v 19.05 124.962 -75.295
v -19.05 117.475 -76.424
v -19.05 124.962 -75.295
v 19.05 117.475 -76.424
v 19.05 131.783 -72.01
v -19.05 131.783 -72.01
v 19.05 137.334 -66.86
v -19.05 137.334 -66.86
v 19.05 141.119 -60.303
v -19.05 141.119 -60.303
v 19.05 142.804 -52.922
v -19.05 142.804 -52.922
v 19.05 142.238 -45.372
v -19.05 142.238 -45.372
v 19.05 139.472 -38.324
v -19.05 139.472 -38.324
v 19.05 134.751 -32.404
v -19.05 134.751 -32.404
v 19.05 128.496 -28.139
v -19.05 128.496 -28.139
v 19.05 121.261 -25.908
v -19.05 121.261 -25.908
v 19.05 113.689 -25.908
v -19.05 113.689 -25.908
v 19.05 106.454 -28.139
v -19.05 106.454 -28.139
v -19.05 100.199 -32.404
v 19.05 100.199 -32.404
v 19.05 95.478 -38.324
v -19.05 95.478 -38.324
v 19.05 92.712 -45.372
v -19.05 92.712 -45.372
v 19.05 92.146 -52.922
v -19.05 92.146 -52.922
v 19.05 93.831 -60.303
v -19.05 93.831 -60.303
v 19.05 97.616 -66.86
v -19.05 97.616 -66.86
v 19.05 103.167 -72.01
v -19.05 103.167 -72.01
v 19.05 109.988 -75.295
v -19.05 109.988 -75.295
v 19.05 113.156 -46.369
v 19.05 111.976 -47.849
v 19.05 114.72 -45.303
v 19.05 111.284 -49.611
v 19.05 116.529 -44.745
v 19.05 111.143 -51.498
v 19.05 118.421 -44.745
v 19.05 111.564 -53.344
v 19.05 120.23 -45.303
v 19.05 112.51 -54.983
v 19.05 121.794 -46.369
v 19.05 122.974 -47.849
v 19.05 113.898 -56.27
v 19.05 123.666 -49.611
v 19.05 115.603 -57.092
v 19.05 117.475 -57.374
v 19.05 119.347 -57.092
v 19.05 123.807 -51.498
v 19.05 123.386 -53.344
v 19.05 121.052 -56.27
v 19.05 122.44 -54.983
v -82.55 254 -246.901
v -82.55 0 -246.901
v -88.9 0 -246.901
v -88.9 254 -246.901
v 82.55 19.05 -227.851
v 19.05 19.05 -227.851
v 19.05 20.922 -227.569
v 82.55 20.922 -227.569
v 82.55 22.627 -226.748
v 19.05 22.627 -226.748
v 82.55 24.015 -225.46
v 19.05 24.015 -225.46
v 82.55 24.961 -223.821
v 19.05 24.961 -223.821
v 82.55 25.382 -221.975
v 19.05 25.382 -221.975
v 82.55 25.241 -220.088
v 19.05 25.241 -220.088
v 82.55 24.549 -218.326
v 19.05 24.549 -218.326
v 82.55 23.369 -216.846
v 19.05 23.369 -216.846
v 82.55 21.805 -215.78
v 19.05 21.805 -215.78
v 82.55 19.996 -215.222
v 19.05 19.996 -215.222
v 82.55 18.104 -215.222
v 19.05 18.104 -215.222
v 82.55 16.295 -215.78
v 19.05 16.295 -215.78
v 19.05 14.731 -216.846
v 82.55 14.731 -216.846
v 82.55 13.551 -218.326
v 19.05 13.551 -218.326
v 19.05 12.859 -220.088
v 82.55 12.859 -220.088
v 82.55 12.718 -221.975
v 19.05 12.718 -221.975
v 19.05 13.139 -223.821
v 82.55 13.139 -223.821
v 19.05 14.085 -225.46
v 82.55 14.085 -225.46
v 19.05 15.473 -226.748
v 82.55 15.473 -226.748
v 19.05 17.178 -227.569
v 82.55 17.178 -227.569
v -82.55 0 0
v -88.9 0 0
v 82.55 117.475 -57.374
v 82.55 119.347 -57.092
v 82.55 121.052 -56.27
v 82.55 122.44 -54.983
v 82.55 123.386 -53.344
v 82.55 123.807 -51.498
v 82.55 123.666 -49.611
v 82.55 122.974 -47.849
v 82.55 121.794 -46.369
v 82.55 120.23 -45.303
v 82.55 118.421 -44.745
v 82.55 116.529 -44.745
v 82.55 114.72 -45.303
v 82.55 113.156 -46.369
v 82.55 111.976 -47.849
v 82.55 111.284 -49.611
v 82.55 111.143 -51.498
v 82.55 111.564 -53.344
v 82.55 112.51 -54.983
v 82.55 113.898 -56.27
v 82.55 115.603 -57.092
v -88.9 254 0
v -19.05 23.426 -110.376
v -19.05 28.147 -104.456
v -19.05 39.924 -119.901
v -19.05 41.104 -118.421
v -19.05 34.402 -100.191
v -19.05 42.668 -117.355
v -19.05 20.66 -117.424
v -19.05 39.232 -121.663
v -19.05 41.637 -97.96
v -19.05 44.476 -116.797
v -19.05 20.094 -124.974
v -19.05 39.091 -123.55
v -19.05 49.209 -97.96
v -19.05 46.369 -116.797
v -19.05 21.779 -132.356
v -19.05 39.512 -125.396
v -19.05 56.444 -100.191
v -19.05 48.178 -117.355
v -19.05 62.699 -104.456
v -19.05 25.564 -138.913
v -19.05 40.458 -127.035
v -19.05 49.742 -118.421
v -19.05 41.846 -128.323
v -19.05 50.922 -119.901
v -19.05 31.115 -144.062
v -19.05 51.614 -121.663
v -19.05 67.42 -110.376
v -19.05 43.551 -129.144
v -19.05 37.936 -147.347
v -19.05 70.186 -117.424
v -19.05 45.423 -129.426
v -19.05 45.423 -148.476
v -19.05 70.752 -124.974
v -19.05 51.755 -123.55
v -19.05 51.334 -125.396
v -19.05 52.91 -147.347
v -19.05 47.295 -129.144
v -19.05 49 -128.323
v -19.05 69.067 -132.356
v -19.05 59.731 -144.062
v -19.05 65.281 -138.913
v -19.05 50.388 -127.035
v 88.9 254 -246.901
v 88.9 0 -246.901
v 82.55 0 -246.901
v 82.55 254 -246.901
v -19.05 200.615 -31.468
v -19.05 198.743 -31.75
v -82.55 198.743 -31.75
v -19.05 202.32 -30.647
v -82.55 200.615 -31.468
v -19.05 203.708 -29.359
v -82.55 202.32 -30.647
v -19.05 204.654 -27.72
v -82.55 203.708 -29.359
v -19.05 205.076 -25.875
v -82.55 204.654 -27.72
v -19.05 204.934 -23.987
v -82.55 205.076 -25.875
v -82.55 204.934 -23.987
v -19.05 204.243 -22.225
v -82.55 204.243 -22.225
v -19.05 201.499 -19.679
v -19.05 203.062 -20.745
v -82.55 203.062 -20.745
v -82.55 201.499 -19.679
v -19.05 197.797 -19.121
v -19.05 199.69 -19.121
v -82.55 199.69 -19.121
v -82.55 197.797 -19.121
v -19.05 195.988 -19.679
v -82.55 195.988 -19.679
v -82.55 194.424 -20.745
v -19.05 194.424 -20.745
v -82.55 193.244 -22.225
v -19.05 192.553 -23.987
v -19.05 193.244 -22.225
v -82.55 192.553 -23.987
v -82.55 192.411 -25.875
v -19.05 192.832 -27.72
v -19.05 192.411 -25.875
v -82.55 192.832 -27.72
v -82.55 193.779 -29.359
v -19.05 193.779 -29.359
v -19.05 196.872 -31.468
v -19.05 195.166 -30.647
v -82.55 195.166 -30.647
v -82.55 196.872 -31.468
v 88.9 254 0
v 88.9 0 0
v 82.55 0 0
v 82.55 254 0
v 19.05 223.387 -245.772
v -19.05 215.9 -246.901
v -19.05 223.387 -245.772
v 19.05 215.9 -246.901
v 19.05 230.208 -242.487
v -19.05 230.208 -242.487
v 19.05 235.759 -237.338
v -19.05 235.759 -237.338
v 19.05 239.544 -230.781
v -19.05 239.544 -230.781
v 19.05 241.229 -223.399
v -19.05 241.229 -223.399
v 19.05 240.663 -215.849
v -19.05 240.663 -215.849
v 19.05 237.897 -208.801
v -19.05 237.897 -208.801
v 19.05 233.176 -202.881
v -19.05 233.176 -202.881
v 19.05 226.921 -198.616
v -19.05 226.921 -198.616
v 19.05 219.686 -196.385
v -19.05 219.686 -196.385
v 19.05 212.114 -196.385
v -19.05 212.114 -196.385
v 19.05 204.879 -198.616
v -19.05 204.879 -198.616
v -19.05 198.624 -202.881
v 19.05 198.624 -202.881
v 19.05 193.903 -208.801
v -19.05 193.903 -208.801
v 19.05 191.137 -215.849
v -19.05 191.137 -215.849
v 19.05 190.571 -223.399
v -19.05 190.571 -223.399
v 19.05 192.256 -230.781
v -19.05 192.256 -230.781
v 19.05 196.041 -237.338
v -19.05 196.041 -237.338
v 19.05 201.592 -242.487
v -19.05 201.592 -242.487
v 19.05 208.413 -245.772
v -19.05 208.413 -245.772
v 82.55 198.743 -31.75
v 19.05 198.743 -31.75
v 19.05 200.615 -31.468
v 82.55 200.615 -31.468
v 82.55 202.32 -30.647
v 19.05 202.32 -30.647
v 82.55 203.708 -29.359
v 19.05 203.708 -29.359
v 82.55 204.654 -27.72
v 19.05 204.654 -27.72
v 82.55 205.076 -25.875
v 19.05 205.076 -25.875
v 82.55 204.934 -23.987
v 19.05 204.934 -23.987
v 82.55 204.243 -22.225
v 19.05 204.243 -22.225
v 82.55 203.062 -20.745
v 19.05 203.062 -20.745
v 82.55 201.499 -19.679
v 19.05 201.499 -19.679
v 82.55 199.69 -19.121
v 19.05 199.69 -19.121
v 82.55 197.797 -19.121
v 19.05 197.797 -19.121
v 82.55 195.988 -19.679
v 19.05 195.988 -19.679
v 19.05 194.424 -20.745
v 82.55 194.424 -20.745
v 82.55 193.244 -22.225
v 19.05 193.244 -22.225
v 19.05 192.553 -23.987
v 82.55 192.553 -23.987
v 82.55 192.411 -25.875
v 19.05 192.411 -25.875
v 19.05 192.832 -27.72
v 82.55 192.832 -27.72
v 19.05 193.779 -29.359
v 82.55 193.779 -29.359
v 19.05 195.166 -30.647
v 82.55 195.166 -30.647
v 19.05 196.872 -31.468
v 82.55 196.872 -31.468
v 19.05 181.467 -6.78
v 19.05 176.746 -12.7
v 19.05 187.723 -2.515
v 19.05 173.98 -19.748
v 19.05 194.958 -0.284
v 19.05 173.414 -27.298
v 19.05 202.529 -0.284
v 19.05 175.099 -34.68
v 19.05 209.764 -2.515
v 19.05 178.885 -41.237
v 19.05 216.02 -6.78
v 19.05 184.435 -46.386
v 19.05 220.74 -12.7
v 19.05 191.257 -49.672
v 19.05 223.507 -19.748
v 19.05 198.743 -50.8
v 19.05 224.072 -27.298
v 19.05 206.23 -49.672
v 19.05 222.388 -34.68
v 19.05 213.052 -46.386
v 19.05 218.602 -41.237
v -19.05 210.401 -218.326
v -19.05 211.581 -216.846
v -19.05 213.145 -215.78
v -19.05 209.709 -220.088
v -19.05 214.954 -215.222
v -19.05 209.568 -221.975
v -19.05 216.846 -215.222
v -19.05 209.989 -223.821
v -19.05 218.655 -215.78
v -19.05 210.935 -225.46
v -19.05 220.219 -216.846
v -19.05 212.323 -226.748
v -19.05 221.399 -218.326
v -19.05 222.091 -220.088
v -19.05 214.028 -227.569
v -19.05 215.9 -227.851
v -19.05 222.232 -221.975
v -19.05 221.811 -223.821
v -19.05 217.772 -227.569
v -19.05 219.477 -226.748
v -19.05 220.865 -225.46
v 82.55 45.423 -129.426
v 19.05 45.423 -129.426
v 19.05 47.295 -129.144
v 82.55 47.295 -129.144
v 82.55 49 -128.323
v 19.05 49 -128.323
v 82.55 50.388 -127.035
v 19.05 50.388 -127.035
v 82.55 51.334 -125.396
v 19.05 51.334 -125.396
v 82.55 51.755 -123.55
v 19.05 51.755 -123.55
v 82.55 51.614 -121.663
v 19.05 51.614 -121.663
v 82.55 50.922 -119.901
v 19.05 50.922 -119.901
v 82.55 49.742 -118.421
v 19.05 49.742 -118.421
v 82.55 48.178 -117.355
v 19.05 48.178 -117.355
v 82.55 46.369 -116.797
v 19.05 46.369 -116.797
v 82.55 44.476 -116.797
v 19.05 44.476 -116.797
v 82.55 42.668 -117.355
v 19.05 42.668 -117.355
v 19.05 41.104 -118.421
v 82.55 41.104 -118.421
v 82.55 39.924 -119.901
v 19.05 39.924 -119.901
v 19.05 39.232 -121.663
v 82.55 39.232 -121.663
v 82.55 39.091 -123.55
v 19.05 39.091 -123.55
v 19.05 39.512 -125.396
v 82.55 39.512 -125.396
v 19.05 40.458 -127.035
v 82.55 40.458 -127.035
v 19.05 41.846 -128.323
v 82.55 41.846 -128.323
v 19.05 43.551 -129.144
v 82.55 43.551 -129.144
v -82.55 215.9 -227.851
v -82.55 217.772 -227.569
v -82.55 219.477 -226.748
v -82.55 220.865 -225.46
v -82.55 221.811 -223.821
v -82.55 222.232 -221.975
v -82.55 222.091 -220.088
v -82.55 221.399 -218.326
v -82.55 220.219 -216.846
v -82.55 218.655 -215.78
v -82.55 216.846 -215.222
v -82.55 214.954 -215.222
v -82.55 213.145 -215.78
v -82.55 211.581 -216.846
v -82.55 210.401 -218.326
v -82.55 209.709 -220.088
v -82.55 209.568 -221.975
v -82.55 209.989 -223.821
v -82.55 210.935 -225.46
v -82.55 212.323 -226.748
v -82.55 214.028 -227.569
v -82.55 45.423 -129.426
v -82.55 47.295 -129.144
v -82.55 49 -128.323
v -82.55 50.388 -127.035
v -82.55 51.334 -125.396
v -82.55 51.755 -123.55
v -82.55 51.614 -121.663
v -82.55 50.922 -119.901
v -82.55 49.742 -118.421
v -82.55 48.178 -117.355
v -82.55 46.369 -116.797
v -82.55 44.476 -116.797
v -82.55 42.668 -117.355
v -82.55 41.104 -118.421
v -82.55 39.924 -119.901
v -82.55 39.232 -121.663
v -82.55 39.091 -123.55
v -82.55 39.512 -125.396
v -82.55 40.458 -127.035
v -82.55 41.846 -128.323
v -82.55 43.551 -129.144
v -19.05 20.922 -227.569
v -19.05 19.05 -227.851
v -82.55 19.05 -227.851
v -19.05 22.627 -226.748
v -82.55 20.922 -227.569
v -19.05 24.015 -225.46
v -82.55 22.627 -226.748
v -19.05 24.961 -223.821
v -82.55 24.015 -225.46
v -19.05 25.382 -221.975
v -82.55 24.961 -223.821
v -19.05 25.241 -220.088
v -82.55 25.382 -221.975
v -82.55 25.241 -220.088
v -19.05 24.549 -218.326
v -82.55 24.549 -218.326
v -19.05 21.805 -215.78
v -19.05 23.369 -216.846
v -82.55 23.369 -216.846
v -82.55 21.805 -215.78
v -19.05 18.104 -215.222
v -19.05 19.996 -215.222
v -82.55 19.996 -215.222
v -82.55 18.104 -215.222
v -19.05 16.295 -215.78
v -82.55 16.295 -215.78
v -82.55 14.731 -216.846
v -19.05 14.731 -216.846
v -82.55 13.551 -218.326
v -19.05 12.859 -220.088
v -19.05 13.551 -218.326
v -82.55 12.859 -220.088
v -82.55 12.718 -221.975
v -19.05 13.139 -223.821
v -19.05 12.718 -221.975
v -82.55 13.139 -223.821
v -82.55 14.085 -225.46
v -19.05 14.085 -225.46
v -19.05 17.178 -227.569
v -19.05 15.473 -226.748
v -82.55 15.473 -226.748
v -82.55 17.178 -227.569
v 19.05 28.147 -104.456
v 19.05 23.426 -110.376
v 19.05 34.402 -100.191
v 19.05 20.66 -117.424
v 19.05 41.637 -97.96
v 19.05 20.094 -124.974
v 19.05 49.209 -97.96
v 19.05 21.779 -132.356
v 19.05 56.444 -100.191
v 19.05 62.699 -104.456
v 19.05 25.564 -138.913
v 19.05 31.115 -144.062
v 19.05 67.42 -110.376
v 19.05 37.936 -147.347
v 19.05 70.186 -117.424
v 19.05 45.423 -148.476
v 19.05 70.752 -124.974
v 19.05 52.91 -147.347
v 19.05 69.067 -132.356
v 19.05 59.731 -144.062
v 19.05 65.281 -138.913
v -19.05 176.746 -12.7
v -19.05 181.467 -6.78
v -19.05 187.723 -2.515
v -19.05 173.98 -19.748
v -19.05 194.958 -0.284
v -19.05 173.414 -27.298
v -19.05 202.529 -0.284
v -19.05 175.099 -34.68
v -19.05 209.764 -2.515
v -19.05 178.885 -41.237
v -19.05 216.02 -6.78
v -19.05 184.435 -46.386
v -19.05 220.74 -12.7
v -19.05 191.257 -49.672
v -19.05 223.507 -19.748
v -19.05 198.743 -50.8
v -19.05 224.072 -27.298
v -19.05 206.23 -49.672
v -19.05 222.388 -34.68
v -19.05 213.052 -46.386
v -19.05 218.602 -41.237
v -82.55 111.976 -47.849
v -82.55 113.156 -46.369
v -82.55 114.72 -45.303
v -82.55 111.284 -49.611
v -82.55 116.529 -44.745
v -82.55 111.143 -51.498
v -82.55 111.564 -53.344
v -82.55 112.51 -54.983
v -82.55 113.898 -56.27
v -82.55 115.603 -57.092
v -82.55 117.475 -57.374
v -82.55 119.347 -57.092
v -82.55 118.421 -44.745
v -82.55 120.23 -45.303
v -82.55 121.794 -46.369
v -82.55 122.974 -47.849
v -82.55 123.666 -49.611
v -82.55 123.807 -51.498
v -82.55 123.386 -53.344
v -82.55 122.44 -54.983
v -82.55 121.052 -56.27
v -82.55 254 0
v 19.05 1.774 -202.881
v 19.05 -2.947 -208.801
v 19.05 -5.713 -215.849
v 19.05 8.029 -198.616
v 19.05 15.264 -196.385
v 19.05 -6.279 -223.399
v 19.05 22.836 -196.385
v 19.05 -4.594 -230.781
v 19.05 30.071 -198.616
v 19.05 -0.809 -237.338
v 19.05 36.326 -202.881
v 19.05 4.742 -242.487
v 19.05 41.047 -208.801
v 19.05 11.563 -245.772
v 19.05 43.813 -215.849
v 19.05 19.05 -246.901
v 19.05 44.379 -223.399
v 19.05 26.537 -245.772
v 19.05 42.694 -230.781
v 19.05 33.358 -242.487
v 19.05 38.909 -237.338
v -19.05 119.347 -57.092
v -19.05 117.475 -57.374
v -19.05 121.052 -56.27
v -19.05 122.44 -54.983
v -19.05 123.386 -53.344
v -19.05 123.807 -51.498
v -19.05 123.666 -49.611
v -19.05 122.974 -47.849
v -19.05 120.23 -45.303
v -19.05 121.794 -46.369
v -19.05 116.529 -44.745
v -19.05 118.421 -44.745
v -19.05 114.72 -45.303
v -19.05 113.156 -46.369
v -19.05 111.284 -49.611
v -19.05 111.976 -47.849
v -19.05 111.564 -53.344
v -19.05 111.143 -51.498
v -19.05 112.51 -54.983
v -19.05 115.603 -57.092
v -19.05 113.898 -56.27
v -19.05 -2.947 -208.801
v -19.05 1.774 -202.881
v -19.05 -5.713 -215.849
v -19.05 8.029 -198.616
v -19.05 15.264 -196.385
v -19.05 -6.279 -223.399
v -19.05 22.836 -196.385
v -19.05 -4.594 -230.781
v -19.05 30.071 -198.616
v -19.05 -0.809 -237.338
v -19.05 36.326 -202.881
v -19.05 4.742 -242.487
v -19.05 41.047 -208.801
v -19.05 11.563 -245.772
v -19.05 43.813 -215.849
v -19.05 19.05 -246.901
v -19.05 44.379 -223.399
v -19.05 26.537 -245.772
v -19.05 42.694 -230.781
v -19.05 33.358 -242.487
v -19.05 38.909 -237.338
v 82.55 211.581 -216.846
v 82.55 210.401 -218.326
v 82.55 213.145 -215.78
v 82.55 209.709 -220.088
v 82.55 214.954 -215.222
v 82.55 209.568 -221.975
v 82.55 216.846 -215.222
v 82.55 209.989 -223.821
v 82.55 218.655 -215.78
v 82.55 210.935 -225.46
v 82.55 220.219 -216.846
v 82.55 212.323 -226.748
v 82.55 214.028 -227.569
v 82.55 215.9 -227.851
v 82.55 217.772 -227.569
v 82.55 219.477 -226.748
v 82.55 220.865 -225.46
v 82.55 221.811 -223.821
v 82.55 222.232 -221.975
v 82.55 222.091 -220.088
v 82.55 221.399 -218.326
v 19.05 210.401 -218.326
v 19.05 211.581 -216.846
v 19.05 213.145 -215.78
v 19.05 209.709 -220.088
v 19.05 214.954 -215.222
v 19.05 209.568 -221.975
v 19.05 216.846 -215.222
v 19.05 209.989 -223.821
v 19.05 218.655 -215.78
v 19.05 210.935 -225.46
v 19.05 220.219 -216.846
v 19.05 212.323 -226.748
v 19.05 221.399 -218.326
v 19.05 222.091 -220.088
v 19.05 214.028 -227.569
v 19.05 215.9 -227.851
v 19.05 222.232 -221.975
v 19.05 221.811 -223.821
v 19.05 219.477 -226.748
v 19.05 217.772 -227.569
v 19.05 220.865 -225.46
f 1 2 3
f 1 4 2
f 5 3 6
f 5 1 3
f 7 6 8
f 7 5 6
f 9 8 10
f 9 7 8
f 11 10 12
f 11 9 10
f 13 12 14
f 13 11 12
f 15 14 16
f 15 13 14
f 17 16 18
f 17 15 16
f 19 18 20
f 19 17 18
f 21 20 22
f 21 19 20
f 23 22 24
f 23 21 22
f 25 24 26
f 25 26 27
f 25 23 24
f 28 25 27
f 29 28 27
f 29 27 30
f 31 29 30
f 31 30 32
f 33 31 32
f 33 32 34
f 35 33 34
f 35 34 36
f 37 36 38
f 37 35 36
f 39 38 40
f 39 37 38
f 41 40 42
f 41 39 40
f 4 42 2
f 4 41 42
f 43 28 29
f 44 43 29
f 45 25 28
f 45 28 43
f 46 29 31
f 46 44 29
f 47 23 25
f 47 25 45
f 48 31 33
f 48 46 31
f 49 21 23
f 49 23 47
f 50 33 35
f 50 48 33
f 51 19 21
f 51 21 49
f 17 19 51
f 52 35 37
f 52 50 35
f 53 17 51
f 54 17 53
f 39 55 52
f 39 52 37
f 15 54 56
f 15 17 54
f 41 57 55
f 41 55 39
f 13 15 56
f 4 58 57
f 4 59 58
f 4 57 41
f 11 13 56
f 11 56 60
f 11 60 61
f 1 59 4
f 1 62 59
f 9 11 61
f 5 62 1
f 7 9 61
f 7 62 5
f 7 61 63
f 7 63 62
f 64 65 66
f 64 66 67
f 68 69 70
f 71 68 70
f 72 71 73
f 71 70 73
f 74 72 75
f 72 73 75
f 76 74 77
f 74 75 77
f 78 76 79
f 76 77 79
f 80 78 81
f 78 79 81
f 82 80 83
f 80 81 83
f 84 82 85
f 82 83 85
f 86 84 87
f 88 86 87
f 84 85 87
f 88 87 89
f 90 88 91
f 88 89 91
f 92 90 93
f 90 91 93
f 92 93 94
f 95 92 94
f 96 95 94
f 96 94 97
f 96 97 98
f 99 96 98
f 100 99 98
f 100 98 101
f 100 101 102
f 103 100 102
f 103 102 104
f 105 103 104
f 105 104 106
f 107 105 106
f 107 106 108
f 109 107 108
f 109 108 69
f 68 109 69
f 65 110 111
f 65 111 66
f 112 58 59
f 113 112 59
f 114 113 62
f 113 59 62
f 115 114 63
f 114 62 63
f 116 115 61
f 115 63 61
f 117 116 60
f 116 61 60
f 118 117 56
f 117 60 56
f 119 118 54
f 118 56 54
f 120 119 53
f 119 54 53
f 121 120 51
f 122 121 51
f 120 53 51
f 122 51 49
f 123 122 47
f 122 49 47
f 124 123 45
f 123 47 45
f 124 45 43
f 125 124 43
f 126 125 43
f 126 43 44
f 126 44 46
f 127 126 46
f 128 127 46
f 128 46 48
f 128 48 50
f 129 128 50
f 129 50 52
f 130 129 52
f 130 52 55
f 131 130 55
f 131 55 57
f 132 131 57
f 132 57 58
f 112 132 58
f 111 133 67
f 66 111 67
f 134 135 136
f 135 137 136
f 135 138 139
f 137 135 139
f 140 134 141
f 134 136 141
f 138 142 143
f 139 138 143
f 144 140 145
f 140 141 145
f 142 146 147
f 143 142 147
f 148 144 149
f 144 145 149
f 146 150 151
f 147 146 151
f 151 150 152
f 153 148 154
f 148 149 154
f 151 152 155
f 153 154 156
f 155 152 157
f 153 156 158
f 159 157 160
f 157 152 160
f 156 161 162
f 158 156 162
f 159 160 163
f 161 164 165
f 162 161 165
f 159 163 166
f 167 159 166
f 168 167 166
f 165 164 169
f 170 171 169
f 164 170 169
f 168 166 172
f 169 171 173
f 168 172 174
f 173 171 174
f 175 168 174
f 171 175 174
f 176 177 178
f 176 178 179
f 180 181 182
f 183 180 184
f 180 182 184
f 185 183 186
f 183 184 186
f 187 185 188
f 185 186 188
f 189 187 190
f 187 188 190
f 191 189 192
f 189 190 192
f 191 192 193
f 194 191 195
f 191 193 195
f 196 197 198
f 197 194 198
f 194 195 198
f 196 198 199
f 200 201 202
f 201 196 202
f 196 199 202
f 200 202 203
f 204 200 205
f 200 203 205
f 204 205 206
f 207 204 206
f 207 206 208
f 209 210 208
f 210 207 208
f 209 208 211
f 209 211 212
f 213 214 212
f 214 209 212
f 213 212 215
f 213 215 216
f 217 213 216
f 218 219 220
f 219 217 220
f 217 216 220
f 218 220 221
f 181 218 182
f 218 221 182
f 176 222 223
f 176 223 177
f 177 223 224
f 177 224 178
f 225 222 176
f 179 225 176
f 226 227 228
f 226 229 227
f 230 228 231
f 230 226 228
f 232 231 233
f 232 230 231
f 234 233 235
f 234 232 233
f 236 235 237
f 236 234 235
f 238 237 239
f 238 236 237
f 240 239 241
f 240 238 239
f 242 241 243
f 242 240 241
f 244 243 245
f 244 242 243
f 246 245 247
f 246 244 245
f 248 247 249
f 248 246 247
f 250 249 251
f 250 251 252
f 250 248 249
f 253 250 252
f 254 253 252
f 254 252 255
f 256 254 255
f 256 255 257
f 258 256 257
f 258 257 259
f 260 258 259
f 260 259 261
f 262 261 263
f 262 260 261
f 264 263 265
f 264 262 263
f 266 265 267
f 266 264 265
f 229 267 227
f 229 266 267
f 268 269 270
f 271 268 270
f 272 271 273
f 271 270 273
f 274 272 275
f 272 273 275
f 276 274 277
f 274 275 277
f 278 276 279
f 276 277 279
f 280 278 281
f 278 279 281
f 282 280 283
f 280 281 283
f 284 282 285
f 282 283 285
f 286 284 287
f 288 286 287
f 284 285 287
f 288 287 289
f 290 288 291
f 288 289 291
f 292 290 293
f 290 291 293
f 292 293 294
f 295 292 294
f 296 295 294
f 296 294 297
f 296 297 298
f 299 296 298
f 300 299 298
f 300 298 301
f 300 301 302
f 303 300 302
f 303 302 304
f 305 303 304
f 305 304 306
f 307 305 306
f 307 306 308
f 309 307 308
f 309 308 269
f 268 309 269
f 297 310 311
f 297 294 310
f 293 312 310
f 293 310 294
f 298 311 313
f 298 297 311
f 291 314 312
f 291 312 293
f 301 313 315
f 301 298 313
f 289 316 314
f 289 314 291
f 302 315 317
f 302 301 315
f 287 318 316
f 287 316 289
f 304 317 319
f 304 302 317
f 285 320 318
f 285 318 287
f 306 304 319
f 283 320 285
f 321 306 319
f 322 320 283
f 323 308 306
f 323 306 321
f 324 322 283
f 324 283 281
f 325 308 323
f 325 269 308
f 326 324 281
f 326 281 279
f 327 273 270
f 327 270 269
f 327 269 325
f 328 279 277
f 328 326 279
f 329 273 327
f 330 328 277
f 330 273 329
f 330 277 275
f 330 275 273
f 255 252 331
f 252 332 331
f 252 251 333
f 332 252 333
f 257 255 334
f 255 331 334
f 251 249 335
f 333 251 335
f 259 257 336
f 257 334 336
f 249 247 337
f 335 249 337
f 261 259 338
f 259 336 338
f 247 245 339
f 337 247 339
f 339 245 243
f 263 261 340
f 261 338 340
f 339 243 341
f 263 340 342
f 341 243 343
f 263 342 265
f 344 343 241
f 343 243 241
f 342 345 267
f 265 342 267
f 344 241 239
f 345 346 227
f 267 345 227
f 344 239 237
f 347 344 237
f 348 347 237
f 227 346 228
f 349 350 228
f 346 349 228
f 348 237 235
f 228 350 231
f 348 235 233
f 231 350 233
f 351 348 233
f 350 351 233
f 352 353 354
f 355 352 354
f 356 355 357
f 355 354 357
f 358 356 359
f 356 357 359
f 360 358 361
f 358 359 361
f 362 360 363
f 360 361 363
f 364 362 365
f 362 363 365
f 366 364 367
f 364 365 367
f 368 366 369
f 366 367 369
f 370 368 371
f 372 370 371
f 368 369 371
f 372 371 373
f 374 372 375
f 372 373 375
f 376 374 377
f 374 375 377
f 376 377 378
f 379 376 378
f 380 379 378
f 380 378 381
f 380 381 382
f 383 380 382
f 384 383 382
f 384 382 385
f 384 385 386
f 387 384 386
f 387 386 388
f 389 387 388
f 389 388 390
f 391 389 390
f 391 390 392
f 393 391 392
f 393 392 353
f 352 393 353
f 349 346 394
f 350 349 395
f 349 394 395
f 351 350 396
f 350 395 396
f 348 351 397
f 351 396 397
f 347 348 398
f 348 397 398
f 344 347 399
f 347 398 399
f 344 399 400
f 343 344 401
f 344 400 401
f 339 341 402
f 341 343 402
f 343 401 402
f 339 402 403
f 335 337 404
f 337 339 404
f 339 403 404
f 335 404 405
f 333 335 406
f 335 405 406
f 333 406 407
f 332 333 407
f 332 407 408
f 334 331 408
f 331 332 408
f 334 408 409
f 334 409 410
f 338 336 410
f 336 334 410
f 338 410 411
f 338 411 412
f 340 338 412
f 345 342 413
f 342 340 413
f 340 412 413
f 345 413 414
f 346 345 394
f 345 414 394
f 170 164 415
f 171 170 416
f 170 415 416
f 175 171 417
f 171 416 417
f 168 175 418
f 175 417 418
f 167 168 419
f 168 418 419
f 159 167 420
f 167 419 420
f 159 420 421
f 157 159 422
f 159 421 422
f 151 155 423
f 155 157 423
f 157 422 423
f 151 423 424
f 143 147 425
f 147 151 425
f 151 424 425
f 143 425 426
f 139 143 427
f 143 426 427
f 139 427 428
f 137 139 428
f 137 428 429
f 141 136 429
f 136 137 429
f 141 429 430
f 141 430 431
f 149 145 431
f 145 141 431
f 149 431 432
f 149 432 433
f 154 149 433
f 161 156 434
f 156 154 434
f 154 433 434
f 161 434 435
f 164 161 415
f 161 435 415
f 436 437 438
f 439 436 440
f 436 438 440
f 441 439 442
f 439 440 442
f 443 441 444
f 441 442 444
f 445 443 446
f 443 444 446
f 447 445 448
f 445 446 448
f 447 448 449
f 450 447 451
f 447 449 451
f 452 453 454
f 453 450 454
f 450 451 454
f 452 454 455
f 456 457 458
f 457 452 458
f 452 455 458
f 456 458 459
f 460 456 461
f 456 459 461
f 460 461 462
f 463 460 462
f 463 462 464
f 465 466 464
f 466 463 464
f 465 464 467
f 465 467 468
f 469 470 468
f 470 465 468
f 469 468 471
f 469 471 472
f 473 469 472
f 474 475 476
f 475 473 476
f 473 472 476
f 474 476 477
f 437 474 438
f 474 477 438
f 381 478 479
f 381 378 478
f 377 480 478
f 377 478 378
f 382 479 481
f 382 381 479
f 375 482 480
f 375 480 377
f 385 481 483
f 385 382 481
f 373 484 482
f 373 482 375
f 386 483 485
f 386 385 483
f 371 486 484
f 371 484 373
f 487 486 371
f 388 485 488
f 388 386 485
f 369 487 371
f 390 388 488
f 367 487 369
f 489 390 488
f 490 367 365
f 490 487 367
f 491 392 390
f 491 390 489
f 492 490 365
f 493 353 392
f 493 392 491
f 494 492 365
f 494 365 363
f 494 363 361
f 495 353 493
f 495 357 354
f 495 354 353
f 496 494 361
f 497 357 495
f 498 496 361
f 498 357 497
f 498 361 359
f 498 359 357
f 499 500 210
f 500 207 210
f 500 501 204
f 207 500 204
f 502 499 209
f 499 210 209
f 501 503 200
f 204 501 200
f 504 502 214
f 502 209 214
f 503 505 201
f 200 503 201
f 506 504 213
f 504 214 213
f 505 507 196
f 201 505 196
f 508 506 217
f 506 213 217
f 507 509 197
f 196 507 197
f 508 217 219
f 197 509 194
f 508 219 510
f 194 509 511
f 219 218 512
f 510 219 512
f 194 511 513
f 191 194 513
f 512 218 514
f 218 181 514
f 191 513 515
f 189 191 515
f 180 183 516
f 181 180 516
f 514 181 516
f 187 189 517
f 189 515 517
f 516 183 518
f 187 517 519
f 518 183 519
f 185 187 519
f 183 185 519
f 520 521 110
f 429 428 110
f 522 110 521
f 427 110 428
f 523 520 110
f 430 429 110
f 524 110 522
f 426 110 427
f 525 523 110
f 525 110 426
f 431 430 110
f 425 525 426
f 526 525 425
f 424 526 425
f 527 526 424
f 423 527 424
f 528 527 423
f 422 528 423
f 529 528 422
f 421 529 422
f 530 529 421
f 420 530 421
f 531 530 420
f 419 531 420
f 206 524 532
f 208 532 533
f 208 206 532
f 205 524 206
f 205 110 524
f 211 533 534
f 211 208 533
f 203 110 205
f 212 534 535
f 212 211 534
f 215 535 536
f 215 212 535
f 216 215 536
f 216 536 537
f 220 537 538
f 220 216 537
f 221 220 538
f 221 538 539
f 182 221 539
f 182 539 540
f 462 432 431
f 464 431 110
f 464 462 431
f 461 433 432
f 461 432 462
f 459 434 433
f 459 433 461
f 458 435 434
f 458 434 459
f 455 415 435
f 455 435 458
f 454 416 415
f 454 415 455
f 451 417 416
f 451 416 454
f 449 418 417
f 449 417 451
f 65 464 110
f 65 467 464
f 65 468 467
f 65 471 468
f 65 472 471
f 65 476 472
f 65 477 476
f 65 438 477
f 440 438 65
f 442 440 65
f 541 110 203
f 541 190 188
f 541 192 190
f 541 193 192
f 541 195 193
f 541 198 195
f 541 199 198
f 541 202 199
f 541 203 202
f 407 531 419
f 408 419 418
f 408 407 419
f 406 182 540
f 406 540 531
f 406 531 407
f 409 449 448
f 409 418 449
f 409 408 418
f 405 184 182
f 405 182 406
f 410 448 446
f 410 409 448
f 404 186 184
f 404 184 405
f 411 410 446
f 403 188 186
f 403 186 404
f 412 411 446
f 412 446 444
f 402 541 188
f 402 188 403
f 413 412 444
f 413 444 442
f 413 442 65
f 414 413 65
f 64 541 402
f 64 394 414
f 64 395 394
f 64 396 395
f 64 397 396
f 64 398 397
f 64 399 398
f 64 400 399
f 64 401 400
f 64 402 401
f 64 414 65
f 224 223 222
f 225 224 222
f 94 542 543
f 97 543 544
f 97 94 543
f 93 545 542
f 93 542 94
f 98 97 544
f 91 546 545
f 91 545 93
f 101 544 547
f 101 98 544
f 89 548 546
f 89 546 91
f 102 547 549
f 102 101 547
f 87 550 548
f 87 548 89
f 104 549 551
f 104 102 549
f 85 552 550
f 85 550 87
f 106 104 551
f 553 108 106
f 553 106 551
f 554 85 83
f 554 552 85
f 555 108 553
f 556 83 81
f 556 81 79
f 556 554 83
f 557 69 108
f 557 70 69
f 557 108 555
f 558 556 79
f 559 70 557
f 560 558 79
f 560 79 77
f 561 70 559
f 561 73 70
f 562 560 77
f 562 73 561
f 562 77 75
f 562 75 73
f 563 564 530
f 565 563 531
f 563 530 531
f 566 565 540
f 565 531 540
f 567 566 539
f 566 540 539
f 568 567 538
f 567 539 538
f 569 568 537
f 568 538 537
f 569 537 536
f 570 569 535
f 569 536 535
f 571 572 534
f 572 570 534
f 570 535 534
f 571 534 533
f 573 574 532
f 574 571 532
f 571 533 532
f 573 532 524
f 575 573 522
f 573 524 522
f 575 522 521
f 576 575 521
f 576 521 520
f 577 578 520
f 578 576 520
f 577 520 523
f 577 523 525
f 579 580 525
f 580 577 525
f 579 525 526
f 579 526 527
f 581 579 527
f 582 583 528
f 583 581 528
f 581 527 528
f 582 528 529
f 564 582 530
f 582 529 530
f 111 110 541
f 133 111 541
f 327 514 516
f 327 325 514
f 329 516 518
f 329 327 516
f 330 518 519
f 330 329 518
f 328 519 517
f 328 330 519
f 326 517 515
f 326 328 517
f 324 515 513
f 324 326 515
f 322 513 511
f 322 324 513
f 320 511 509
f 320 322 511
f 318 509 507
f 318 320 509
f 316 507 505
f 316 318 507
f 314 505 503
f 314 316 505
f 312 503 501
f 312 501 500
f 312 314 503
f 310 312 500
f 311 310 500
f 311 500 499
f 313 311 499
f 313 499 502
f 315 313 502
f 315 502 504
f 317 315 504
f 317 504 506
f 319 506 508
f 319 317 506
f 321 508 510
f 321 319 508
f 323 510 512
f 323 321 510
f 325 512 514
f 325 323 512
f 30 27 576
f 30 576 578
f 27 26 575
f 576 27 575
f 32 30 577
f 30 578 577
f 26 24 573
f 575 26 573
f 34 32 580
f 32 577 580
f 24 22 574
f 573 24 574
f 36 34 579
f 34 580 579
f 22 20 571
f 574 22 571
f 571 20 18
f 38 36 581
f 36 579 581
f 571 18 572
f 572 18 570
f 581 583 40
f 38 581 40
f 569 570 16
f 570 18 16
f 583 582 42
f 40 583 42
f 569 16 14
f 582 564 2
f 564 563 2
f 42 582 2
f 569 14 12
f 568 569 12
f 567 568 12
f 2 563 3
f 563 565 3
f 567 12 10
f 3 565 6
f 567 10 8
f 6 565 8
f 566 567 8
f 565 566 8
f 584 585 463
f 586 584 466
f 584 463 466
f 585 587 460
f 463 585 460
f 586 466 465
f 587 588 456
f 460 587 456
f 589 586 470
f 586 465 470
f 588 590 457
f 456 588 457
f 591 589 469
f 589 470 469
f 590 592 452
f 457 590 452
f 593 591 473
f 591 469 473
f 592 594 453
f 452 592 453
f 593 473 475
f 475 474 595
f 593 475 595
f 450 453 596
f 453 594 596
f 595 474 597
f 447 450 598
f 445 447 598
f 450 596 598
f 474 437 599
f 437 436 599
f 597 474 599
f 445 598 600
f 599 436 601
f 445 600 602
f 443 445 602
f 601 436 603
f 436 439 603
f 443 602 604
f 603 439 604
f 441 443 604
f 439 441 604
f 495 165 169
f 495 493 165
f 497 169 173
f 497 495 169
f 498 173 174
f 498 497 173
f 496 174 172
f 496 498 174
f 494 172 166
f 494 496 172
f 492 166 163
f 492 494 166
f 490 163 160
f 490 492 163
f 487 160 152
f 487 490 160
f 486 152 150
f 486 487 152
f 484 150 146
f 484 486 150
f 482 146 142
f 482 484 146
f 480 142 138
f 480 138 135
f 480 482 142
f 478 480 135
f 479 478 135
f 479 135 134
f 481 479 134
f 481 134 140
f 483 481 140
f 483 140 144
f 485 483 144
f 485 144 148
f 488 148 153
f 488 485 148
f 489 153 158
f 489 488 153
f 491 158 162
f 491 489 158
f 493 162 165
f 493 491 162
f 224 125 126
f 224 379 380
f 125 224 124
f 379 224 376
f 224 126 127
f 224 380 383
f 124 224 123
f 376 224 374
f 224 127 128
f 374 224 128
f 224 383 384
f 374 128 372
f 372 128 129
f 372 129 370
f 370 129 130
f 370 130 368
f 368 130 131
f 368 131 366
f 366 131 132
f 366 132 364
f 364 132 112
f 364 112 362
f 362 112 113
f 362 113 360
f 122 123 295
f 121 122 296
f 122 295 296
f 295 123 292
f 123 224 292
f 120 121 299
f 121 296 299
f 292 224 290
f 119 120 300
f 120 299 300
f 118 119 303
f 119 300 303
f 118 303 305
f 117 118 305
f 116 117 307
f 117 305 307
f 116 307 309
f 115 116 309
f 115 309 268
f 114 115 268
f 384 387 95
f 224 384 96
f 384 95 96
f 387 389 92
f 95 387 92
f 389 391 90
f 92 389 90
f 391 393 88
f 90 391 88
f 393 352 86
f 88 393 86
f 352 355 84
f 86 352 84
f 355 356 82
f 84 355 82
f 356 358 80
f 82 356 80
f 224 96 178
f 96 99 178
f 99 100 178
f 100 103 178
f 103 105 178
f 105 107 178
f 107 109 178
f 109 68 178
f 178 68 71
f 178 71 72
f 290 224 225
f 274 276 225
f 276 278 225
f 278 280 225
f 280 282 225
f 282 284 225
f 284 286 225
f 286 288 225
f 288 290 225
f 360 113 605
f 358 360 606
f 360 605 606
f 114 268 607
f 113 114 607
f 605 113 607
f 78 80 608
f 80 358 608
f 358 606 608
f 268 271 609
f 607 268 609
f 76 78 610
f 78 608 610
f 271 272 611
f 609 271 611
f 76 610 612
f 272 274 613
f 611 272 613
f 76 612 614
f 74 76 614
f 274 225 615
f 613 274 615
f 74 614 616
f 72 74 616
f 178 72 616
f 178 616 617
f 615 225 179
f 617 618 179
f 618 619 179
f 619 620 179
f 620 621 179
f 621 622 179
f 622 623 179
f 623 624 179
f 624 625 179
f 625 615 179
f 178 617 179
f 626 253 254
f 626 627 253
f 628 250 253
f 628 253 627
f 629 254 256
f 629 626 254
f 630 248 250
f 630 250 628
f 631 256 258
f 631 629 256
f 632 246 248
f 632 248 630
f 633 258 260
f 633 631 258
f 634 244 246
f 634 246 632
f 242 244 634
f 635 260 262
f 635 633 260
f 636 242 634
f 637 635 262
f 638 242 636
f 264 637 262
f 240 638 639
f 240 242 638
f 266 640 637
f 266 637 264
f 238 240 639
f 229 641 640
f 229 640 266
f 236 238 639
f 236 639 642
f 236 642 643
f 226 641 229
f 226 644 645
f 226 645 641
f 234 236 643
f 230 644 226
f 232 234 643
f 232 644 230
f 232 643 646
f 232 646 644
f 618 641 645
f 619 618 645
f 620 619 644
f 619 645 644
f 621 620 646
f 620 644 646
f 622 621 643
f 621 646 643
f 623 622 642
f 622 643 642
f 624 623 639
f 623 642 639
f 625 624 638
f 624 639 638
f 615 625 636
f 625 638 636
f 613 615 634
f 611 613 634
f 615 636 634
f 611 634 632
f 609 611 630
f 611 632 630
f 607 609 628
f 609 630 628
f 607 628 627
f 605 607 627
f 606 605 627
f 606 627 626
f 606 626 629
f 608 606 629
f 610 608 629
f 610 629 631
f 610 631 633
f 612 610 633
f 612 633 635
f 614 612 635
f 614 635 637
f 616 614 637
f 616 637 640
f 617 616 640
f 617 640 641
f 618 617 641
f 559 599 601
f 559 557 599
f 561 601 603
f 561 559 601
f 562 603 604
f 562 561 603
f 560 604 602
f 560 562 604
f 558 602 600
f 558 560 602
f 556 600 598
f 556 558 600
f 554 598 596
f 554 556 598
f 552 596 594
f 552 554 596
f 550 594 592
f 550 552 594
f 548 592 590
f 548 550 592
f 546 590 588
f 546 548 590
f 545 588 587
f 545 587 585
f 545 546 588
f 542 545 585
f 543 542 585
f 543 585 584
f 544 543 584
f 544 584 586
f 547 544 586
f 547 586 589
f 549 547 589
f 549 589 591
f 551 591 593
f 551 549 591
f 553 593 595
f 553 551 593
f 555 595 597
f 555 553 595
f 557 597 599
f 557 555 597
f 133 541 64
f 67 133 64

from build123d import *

# Parameters (mm, degrees)
SKETCH1_W               = 246.900926319
SKETCH1_H               = 254
BOSS_EXTRUDE1_DEPTH     = 88.9
SKETCH2_W               = 165.1
SKETCH2_H               = 246.900926319
CUT_EXTRUDE1_DEPTH      = 1
CUT_EXTRUDE1_DEPTH_BACK = 255
SKETCH3_R               = 25.4
BOSS_EXTRUDE2_DEPTH     = 19.05
BOSS_EXTRUDE2_2_DEPTH   = 19.05
BOSS_EXTRUDE2_3_DEPTH   = 19.05
BOSS_EXTRUDE2_4_DEPTH   = 19.05
BOSS_EXTRUDE2_5_DEPTH   = 19.05
BOSS_EXTRUDE3_START     = -82.55
SKETCH4_R               = 6.35
BOSS_EXTRUDE3_DEPTH     = 165.1


with BuildPart() as part:
    # Sketch1 → Boss-Extrude1 (new body, symmetric)
    with BuildSketch(Plane(origin=(0, 0, 0), x_dir=(0, 0, -1), z_dir=(1, 0, 0))):
        with Locations((123.45046316, 127)):
            Rectangle(SKETCH1_W, SKETCH1_H)
    extrude(amount=BOSS_EXTRUDE1_DEPTH, both=True)

    # Sketch2 → Cut-Extrude1 (cut, two sides)
    with BuildSketch(Plane(origin=(0, 254, 0), x_dir=(1, 0, 0), z_dir=(0, 1, 0))) as cut_extrude1_sk:
        with Locations((0, 123.45046316)):
            Rectangle(SKETCH2_W, SKETCH2_H)
    extrude(amount=CUT_EXTRUDE1_DEPTH, mode=Mode.SUBTRACT)
    extrude(cut_extrude1_sk.sketch, amount=-CUT_EXTRUDE1_DEPTH_BACK, mode=Mode.SUBTRACT)



with BuildPart() as body_2:
    # Sketch3 → Boss-Extrude2 (new body, symmetric)
    with BuildSketch(Plane(origin=(0, 0, 0), x_dir=(0, 0, -1), z_dir=(1, 0, 0))):
        with Locations((221.500926319, 215.9)):
            Circle(SKETCH3_R)
    extrude(amount=BOSS_EXTRUDE2_DEPTH, both=True)


with BuildPart() as body_3:
    # Sketch3 → Boss-Extrude2 2 (new body, symmetric)
    with BuildSketch(Plane(origin=(0, 0, 0), x_dir=(0, 0, -1), z_dir=(1, 0, 0))):
        with Locations((25.4, 198.74339204)):
            Circle(SKETCH3_R)
    extrude(amount=BOSS_EXTRUDE2_2_DEPTH, both=True)


with BuildPart() as body_4:
    # Sketch3 → Boss-Extrude2 3 (new body, symmetric)
    with BuildSketch(Plane(origin=(0, 0, 0), x_dir=(0, 0, -1), z_dir=(1, 0, 0))):
        with Locations((221.500926319, 19.05)):
            Circle(SKETCH3_R)
    extrude(amount=BOSS_EXTRUDE2_3_DEPTH, both=True)


with BuildPart() as body_5:
    # Sketch3 → Boss-Extrude2 4 (new body, symmetric)
    with BuildSketch(Plane(origin=(0, 0, 0), x_dir=(0, 0, -1), z_dir=(1, 0, 0))):
        with Locations((123.075926319, 45.422899265)):
            Circle(SKETCH3_R)
    extrude(amount=BOSS_EXTRUDE2_4_DEPTH, both=True)


with BuildPart() as body_6:
    # Sketch3 → Boss-Extrude2 5 (new body, symmetric)
    with BuildSketch(Plane(origin=(0, 0, 0), x_dir=(0, 0, -1), z_dir=(1, 0, 0))):
        with Locations((51.023825584, 117.475)):
            Circle(SKETCH3_R)
    extrude(amount=BOSS_EXTRUDE2_5_DEPTH, both=True)


with BuildPart() as part_1:
    add(part.part)

    add(body_2.part)  # Boss-Extrude3 merges body 2

    add(body_3.part)  # Boss-Extrude3 merges body 3

    add(body_4.part)  # Boss-Extrude3 merges body 4

    add(body_5.part)  # Boss-Extrude3 merges body 5

    add(body_6.part)  # Boss-Extrude3 merges body 6
    # Sketch4 → Boss-Extrude3 (add)
    with BuildSketch(Plane(origin=(0, 0, 0), x_dir=(0, 0, -1), z_dir=(1, 0, 0)).offset(BOSS_EXTRUDE3_START)):
        with Locations((221.500926319, 19.05)):
            Circle(SKETCH4_R)
        with Locations((123.075926319, 45.422899265)):
            Circle(SKETCH4_R)
        with Locations((51.023825584, 117.475)):
            Circle(SKETCH4_R)
        with Locations((25.4, 198.74339204)):
            Circle(SKETCH4_R)
        with Locations((221.500926319, 215.9)):
            Circle(SKETCH4_R)
    extrude(amount=BOSS_EXTRUDE3_DEPTH)


solid = part_1.part
